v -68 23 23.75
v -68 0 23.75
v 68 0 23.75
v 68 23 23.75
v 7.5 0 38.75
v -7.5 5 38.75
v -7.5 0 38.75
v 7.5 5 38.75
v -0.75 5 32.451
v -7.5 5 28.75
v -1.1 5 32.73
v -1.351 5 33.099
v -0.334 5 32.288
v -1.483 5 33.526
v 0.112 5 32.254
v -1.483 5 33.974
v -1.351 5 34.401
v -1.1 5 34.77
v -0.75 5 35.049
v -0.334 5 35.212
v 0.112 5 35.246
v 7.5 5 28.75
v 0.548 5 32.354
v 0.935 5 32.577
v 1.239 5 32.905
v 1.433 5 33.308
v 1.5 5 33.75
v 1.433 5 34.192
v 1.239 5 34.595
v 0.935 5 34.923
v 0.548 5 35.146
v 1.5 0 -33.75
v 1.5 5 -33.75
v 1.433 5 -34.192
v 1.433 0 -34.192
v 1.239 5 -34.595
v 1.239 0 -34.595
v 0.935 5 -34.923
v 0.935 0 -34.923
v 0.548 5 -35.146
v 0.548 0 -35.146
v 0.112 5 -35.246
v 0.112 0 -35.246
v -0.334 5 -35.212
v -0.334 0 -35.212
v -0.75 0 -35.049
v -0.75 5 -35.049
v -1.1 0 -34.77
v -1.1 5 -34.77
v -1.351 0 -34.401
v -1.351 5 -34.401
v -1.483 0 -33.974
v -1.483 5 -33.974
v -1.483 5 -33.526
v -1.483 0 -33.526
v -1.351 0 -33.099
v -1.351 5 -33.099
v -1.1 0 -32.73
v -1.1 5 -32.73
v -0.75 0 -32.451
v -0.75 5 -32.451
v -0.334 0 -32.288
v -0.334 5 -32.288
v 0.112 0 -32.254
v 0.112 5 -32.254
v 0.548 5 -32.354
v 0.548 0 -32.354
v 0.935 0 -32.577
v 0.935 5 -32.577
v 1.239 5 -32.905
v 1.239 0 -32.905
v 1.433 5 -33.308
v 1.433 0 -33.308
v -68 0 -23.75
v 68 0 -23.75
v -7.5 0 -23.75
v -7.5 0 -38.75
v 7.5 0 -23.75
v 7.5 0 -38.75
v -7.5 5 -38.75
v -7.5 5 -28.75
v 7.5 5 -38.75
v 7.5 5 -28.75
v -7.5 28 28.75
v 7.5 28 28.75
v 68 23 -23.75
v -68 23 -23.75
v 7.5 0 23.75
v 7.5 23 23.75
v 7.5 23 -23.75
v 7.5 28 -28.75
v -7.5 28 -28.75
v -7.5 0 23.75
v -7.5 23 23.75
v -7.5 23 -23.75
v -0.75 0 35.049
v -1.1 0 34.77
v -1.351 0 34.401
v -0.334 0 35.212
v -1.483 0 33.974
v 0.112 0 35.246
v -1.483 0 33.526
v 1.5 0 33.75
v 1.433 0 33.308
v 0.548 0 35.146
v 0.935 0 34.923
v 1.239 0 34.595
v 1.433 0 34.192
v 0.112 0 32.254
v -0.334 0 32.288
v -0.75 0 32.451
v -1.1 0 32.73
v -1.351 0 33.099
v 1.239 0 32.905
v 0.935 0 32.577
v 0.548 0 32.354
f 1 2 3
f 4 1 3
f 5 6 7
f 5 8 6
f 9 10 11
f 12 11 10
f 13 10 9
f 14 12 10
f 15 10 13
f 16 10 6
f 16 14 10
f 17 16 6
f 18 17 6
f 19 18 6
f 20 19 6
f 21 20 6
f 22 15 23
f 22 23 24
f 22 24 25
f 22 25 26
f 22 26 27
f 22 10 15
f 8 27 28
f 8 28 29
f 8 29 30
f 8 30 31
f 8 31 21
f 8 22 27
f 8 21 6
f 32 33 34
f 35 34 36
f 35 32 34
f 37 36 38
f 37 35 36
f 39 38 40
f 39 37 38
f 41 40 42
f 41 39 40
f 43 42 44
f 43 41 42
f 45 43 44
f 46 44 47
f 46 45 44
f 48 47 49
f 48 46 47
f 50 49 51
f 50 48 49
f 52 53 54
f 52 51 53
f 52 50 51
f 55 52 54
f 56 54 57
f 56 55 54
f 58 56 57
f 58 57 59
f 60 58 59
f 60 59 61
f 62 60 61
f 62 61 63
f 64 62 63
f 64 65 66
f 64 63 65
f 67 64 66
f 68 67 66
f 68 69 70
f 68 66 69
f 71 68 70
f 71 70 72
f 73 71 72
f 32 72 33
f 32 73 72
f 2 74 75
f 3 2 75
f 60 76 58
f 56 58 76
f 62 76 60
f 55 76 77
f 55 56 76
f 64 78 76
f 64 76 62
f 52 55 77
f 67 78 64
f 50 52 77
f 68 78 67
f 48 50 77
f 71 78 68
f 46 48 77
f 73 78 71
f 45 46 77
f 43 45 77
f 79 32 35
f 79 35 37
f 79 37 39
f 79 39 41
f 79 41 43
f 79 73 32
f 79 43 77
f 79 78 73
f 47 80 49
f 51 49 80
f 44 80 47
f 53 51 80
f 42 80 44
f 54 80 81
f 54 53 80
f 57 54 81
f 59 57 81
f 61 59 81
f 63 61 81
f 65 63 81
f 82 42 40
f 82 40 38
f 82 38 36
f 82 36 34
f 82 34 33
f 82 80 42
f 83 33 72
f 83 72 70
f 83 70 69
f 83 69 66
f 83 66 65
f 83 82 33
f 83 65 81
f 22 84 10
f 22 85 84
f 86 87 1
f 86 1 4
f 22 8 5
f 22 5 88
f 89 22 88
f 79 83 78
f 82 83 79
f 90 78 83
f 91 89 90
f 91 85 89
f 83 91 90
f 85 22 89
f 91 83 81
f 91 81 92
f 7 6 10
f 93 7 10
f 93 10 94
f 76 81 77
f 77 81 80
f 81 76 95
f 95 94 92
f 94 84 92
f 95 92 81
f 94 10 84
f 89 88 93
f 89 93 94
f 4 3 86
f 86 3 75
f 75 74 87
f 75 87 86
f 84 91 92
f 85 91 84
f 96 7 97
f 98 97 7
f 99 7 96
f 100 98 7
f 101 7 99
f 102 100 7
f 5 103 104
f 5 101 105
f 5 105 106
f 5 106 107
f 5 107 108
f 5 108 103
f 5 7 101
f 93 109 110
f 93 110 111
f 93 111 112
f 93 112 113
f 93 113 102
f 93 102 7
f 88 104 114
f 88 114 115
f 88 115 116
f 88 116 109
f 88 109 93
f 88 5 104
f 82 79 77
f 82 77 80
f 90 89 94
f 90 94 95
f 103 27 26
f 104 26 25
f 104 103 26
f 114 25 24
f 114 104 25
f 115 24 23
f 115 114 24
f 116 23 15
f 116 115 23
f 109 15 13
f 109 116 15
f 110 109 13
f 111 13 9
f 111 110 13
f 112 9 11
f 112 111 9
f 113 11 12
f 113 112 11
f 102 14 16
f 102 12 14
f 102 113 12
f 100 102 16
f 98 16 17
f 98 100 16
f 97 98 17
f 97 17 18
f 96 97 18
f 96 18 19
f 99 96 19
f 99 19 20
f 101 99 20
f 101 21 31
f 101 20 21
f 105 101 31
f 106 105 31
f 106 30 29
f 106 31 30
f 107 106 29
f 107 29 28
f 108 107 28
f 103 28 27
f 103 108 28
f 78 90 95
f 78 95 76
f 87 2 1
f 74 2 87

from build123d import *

# Parameters (mm, degrees)
SKETCH1_W           = 136
SKETCH1_H           = 47.5
BOSS_EXTRUDE1_DEPTH = 23
BOSS_EXTRUDE2_DEPTH = 7.5
SKETCH6_R           = 1.5
CUT_EXTRUDE1_DEPTH  = 10


with BuildPart() as part:
    # Sketch1 → Boss-Extrude1 (new body)
    with BuildSketch(Plane(origin=(0, 0, 0), x_dir=(1, 0, 0), z_dir=(0, 1, 0))):
        Rectangle(SKETCH1_W, SKETCH1_H)
    extrude(amount=BOSS_EXTRUDE1_DEPTH)


with BuildPart() as body_2:
    # Sketch5 → Boss-Extrude2 (new body, symmetric)
    with BuildSketch(Plane(origin=(0, 0, 0), x_dir=(0, 0, -1), z_dir=(1, 0, 0))):
        Polygon((-38.75, 5), (-38.75, 0), (-23.75, 0), (-23.75, 23), (23.75, 23), (23.75, 0), (38.75, 0), (38.75, 5), (28.75, 5), (28.75, 28), (-28.75, 28), (-28.75, 5), align=None)
    extrude(amount=BOSS_EXTRUDE2_DEPTH, both=True)

    # Sketch6 → Cut-Extrude1 (cut)
    with BuildSketch(Plane(origin=(0, 0, 0), x_dir=(1, 0, 0), z_dir=(0, 1, 0))):
        with Locations((0, 33.75)):
            Circle(SKETCH6_R)
        with Locations((0, -33.75)):
            Circle(SKETCH6_R)
    extrude(amount=CUT_EXTRUDE1_DEPTH, mode=Mode.SUBTRACT)


solid = Compound([part.part, body_2.part])
